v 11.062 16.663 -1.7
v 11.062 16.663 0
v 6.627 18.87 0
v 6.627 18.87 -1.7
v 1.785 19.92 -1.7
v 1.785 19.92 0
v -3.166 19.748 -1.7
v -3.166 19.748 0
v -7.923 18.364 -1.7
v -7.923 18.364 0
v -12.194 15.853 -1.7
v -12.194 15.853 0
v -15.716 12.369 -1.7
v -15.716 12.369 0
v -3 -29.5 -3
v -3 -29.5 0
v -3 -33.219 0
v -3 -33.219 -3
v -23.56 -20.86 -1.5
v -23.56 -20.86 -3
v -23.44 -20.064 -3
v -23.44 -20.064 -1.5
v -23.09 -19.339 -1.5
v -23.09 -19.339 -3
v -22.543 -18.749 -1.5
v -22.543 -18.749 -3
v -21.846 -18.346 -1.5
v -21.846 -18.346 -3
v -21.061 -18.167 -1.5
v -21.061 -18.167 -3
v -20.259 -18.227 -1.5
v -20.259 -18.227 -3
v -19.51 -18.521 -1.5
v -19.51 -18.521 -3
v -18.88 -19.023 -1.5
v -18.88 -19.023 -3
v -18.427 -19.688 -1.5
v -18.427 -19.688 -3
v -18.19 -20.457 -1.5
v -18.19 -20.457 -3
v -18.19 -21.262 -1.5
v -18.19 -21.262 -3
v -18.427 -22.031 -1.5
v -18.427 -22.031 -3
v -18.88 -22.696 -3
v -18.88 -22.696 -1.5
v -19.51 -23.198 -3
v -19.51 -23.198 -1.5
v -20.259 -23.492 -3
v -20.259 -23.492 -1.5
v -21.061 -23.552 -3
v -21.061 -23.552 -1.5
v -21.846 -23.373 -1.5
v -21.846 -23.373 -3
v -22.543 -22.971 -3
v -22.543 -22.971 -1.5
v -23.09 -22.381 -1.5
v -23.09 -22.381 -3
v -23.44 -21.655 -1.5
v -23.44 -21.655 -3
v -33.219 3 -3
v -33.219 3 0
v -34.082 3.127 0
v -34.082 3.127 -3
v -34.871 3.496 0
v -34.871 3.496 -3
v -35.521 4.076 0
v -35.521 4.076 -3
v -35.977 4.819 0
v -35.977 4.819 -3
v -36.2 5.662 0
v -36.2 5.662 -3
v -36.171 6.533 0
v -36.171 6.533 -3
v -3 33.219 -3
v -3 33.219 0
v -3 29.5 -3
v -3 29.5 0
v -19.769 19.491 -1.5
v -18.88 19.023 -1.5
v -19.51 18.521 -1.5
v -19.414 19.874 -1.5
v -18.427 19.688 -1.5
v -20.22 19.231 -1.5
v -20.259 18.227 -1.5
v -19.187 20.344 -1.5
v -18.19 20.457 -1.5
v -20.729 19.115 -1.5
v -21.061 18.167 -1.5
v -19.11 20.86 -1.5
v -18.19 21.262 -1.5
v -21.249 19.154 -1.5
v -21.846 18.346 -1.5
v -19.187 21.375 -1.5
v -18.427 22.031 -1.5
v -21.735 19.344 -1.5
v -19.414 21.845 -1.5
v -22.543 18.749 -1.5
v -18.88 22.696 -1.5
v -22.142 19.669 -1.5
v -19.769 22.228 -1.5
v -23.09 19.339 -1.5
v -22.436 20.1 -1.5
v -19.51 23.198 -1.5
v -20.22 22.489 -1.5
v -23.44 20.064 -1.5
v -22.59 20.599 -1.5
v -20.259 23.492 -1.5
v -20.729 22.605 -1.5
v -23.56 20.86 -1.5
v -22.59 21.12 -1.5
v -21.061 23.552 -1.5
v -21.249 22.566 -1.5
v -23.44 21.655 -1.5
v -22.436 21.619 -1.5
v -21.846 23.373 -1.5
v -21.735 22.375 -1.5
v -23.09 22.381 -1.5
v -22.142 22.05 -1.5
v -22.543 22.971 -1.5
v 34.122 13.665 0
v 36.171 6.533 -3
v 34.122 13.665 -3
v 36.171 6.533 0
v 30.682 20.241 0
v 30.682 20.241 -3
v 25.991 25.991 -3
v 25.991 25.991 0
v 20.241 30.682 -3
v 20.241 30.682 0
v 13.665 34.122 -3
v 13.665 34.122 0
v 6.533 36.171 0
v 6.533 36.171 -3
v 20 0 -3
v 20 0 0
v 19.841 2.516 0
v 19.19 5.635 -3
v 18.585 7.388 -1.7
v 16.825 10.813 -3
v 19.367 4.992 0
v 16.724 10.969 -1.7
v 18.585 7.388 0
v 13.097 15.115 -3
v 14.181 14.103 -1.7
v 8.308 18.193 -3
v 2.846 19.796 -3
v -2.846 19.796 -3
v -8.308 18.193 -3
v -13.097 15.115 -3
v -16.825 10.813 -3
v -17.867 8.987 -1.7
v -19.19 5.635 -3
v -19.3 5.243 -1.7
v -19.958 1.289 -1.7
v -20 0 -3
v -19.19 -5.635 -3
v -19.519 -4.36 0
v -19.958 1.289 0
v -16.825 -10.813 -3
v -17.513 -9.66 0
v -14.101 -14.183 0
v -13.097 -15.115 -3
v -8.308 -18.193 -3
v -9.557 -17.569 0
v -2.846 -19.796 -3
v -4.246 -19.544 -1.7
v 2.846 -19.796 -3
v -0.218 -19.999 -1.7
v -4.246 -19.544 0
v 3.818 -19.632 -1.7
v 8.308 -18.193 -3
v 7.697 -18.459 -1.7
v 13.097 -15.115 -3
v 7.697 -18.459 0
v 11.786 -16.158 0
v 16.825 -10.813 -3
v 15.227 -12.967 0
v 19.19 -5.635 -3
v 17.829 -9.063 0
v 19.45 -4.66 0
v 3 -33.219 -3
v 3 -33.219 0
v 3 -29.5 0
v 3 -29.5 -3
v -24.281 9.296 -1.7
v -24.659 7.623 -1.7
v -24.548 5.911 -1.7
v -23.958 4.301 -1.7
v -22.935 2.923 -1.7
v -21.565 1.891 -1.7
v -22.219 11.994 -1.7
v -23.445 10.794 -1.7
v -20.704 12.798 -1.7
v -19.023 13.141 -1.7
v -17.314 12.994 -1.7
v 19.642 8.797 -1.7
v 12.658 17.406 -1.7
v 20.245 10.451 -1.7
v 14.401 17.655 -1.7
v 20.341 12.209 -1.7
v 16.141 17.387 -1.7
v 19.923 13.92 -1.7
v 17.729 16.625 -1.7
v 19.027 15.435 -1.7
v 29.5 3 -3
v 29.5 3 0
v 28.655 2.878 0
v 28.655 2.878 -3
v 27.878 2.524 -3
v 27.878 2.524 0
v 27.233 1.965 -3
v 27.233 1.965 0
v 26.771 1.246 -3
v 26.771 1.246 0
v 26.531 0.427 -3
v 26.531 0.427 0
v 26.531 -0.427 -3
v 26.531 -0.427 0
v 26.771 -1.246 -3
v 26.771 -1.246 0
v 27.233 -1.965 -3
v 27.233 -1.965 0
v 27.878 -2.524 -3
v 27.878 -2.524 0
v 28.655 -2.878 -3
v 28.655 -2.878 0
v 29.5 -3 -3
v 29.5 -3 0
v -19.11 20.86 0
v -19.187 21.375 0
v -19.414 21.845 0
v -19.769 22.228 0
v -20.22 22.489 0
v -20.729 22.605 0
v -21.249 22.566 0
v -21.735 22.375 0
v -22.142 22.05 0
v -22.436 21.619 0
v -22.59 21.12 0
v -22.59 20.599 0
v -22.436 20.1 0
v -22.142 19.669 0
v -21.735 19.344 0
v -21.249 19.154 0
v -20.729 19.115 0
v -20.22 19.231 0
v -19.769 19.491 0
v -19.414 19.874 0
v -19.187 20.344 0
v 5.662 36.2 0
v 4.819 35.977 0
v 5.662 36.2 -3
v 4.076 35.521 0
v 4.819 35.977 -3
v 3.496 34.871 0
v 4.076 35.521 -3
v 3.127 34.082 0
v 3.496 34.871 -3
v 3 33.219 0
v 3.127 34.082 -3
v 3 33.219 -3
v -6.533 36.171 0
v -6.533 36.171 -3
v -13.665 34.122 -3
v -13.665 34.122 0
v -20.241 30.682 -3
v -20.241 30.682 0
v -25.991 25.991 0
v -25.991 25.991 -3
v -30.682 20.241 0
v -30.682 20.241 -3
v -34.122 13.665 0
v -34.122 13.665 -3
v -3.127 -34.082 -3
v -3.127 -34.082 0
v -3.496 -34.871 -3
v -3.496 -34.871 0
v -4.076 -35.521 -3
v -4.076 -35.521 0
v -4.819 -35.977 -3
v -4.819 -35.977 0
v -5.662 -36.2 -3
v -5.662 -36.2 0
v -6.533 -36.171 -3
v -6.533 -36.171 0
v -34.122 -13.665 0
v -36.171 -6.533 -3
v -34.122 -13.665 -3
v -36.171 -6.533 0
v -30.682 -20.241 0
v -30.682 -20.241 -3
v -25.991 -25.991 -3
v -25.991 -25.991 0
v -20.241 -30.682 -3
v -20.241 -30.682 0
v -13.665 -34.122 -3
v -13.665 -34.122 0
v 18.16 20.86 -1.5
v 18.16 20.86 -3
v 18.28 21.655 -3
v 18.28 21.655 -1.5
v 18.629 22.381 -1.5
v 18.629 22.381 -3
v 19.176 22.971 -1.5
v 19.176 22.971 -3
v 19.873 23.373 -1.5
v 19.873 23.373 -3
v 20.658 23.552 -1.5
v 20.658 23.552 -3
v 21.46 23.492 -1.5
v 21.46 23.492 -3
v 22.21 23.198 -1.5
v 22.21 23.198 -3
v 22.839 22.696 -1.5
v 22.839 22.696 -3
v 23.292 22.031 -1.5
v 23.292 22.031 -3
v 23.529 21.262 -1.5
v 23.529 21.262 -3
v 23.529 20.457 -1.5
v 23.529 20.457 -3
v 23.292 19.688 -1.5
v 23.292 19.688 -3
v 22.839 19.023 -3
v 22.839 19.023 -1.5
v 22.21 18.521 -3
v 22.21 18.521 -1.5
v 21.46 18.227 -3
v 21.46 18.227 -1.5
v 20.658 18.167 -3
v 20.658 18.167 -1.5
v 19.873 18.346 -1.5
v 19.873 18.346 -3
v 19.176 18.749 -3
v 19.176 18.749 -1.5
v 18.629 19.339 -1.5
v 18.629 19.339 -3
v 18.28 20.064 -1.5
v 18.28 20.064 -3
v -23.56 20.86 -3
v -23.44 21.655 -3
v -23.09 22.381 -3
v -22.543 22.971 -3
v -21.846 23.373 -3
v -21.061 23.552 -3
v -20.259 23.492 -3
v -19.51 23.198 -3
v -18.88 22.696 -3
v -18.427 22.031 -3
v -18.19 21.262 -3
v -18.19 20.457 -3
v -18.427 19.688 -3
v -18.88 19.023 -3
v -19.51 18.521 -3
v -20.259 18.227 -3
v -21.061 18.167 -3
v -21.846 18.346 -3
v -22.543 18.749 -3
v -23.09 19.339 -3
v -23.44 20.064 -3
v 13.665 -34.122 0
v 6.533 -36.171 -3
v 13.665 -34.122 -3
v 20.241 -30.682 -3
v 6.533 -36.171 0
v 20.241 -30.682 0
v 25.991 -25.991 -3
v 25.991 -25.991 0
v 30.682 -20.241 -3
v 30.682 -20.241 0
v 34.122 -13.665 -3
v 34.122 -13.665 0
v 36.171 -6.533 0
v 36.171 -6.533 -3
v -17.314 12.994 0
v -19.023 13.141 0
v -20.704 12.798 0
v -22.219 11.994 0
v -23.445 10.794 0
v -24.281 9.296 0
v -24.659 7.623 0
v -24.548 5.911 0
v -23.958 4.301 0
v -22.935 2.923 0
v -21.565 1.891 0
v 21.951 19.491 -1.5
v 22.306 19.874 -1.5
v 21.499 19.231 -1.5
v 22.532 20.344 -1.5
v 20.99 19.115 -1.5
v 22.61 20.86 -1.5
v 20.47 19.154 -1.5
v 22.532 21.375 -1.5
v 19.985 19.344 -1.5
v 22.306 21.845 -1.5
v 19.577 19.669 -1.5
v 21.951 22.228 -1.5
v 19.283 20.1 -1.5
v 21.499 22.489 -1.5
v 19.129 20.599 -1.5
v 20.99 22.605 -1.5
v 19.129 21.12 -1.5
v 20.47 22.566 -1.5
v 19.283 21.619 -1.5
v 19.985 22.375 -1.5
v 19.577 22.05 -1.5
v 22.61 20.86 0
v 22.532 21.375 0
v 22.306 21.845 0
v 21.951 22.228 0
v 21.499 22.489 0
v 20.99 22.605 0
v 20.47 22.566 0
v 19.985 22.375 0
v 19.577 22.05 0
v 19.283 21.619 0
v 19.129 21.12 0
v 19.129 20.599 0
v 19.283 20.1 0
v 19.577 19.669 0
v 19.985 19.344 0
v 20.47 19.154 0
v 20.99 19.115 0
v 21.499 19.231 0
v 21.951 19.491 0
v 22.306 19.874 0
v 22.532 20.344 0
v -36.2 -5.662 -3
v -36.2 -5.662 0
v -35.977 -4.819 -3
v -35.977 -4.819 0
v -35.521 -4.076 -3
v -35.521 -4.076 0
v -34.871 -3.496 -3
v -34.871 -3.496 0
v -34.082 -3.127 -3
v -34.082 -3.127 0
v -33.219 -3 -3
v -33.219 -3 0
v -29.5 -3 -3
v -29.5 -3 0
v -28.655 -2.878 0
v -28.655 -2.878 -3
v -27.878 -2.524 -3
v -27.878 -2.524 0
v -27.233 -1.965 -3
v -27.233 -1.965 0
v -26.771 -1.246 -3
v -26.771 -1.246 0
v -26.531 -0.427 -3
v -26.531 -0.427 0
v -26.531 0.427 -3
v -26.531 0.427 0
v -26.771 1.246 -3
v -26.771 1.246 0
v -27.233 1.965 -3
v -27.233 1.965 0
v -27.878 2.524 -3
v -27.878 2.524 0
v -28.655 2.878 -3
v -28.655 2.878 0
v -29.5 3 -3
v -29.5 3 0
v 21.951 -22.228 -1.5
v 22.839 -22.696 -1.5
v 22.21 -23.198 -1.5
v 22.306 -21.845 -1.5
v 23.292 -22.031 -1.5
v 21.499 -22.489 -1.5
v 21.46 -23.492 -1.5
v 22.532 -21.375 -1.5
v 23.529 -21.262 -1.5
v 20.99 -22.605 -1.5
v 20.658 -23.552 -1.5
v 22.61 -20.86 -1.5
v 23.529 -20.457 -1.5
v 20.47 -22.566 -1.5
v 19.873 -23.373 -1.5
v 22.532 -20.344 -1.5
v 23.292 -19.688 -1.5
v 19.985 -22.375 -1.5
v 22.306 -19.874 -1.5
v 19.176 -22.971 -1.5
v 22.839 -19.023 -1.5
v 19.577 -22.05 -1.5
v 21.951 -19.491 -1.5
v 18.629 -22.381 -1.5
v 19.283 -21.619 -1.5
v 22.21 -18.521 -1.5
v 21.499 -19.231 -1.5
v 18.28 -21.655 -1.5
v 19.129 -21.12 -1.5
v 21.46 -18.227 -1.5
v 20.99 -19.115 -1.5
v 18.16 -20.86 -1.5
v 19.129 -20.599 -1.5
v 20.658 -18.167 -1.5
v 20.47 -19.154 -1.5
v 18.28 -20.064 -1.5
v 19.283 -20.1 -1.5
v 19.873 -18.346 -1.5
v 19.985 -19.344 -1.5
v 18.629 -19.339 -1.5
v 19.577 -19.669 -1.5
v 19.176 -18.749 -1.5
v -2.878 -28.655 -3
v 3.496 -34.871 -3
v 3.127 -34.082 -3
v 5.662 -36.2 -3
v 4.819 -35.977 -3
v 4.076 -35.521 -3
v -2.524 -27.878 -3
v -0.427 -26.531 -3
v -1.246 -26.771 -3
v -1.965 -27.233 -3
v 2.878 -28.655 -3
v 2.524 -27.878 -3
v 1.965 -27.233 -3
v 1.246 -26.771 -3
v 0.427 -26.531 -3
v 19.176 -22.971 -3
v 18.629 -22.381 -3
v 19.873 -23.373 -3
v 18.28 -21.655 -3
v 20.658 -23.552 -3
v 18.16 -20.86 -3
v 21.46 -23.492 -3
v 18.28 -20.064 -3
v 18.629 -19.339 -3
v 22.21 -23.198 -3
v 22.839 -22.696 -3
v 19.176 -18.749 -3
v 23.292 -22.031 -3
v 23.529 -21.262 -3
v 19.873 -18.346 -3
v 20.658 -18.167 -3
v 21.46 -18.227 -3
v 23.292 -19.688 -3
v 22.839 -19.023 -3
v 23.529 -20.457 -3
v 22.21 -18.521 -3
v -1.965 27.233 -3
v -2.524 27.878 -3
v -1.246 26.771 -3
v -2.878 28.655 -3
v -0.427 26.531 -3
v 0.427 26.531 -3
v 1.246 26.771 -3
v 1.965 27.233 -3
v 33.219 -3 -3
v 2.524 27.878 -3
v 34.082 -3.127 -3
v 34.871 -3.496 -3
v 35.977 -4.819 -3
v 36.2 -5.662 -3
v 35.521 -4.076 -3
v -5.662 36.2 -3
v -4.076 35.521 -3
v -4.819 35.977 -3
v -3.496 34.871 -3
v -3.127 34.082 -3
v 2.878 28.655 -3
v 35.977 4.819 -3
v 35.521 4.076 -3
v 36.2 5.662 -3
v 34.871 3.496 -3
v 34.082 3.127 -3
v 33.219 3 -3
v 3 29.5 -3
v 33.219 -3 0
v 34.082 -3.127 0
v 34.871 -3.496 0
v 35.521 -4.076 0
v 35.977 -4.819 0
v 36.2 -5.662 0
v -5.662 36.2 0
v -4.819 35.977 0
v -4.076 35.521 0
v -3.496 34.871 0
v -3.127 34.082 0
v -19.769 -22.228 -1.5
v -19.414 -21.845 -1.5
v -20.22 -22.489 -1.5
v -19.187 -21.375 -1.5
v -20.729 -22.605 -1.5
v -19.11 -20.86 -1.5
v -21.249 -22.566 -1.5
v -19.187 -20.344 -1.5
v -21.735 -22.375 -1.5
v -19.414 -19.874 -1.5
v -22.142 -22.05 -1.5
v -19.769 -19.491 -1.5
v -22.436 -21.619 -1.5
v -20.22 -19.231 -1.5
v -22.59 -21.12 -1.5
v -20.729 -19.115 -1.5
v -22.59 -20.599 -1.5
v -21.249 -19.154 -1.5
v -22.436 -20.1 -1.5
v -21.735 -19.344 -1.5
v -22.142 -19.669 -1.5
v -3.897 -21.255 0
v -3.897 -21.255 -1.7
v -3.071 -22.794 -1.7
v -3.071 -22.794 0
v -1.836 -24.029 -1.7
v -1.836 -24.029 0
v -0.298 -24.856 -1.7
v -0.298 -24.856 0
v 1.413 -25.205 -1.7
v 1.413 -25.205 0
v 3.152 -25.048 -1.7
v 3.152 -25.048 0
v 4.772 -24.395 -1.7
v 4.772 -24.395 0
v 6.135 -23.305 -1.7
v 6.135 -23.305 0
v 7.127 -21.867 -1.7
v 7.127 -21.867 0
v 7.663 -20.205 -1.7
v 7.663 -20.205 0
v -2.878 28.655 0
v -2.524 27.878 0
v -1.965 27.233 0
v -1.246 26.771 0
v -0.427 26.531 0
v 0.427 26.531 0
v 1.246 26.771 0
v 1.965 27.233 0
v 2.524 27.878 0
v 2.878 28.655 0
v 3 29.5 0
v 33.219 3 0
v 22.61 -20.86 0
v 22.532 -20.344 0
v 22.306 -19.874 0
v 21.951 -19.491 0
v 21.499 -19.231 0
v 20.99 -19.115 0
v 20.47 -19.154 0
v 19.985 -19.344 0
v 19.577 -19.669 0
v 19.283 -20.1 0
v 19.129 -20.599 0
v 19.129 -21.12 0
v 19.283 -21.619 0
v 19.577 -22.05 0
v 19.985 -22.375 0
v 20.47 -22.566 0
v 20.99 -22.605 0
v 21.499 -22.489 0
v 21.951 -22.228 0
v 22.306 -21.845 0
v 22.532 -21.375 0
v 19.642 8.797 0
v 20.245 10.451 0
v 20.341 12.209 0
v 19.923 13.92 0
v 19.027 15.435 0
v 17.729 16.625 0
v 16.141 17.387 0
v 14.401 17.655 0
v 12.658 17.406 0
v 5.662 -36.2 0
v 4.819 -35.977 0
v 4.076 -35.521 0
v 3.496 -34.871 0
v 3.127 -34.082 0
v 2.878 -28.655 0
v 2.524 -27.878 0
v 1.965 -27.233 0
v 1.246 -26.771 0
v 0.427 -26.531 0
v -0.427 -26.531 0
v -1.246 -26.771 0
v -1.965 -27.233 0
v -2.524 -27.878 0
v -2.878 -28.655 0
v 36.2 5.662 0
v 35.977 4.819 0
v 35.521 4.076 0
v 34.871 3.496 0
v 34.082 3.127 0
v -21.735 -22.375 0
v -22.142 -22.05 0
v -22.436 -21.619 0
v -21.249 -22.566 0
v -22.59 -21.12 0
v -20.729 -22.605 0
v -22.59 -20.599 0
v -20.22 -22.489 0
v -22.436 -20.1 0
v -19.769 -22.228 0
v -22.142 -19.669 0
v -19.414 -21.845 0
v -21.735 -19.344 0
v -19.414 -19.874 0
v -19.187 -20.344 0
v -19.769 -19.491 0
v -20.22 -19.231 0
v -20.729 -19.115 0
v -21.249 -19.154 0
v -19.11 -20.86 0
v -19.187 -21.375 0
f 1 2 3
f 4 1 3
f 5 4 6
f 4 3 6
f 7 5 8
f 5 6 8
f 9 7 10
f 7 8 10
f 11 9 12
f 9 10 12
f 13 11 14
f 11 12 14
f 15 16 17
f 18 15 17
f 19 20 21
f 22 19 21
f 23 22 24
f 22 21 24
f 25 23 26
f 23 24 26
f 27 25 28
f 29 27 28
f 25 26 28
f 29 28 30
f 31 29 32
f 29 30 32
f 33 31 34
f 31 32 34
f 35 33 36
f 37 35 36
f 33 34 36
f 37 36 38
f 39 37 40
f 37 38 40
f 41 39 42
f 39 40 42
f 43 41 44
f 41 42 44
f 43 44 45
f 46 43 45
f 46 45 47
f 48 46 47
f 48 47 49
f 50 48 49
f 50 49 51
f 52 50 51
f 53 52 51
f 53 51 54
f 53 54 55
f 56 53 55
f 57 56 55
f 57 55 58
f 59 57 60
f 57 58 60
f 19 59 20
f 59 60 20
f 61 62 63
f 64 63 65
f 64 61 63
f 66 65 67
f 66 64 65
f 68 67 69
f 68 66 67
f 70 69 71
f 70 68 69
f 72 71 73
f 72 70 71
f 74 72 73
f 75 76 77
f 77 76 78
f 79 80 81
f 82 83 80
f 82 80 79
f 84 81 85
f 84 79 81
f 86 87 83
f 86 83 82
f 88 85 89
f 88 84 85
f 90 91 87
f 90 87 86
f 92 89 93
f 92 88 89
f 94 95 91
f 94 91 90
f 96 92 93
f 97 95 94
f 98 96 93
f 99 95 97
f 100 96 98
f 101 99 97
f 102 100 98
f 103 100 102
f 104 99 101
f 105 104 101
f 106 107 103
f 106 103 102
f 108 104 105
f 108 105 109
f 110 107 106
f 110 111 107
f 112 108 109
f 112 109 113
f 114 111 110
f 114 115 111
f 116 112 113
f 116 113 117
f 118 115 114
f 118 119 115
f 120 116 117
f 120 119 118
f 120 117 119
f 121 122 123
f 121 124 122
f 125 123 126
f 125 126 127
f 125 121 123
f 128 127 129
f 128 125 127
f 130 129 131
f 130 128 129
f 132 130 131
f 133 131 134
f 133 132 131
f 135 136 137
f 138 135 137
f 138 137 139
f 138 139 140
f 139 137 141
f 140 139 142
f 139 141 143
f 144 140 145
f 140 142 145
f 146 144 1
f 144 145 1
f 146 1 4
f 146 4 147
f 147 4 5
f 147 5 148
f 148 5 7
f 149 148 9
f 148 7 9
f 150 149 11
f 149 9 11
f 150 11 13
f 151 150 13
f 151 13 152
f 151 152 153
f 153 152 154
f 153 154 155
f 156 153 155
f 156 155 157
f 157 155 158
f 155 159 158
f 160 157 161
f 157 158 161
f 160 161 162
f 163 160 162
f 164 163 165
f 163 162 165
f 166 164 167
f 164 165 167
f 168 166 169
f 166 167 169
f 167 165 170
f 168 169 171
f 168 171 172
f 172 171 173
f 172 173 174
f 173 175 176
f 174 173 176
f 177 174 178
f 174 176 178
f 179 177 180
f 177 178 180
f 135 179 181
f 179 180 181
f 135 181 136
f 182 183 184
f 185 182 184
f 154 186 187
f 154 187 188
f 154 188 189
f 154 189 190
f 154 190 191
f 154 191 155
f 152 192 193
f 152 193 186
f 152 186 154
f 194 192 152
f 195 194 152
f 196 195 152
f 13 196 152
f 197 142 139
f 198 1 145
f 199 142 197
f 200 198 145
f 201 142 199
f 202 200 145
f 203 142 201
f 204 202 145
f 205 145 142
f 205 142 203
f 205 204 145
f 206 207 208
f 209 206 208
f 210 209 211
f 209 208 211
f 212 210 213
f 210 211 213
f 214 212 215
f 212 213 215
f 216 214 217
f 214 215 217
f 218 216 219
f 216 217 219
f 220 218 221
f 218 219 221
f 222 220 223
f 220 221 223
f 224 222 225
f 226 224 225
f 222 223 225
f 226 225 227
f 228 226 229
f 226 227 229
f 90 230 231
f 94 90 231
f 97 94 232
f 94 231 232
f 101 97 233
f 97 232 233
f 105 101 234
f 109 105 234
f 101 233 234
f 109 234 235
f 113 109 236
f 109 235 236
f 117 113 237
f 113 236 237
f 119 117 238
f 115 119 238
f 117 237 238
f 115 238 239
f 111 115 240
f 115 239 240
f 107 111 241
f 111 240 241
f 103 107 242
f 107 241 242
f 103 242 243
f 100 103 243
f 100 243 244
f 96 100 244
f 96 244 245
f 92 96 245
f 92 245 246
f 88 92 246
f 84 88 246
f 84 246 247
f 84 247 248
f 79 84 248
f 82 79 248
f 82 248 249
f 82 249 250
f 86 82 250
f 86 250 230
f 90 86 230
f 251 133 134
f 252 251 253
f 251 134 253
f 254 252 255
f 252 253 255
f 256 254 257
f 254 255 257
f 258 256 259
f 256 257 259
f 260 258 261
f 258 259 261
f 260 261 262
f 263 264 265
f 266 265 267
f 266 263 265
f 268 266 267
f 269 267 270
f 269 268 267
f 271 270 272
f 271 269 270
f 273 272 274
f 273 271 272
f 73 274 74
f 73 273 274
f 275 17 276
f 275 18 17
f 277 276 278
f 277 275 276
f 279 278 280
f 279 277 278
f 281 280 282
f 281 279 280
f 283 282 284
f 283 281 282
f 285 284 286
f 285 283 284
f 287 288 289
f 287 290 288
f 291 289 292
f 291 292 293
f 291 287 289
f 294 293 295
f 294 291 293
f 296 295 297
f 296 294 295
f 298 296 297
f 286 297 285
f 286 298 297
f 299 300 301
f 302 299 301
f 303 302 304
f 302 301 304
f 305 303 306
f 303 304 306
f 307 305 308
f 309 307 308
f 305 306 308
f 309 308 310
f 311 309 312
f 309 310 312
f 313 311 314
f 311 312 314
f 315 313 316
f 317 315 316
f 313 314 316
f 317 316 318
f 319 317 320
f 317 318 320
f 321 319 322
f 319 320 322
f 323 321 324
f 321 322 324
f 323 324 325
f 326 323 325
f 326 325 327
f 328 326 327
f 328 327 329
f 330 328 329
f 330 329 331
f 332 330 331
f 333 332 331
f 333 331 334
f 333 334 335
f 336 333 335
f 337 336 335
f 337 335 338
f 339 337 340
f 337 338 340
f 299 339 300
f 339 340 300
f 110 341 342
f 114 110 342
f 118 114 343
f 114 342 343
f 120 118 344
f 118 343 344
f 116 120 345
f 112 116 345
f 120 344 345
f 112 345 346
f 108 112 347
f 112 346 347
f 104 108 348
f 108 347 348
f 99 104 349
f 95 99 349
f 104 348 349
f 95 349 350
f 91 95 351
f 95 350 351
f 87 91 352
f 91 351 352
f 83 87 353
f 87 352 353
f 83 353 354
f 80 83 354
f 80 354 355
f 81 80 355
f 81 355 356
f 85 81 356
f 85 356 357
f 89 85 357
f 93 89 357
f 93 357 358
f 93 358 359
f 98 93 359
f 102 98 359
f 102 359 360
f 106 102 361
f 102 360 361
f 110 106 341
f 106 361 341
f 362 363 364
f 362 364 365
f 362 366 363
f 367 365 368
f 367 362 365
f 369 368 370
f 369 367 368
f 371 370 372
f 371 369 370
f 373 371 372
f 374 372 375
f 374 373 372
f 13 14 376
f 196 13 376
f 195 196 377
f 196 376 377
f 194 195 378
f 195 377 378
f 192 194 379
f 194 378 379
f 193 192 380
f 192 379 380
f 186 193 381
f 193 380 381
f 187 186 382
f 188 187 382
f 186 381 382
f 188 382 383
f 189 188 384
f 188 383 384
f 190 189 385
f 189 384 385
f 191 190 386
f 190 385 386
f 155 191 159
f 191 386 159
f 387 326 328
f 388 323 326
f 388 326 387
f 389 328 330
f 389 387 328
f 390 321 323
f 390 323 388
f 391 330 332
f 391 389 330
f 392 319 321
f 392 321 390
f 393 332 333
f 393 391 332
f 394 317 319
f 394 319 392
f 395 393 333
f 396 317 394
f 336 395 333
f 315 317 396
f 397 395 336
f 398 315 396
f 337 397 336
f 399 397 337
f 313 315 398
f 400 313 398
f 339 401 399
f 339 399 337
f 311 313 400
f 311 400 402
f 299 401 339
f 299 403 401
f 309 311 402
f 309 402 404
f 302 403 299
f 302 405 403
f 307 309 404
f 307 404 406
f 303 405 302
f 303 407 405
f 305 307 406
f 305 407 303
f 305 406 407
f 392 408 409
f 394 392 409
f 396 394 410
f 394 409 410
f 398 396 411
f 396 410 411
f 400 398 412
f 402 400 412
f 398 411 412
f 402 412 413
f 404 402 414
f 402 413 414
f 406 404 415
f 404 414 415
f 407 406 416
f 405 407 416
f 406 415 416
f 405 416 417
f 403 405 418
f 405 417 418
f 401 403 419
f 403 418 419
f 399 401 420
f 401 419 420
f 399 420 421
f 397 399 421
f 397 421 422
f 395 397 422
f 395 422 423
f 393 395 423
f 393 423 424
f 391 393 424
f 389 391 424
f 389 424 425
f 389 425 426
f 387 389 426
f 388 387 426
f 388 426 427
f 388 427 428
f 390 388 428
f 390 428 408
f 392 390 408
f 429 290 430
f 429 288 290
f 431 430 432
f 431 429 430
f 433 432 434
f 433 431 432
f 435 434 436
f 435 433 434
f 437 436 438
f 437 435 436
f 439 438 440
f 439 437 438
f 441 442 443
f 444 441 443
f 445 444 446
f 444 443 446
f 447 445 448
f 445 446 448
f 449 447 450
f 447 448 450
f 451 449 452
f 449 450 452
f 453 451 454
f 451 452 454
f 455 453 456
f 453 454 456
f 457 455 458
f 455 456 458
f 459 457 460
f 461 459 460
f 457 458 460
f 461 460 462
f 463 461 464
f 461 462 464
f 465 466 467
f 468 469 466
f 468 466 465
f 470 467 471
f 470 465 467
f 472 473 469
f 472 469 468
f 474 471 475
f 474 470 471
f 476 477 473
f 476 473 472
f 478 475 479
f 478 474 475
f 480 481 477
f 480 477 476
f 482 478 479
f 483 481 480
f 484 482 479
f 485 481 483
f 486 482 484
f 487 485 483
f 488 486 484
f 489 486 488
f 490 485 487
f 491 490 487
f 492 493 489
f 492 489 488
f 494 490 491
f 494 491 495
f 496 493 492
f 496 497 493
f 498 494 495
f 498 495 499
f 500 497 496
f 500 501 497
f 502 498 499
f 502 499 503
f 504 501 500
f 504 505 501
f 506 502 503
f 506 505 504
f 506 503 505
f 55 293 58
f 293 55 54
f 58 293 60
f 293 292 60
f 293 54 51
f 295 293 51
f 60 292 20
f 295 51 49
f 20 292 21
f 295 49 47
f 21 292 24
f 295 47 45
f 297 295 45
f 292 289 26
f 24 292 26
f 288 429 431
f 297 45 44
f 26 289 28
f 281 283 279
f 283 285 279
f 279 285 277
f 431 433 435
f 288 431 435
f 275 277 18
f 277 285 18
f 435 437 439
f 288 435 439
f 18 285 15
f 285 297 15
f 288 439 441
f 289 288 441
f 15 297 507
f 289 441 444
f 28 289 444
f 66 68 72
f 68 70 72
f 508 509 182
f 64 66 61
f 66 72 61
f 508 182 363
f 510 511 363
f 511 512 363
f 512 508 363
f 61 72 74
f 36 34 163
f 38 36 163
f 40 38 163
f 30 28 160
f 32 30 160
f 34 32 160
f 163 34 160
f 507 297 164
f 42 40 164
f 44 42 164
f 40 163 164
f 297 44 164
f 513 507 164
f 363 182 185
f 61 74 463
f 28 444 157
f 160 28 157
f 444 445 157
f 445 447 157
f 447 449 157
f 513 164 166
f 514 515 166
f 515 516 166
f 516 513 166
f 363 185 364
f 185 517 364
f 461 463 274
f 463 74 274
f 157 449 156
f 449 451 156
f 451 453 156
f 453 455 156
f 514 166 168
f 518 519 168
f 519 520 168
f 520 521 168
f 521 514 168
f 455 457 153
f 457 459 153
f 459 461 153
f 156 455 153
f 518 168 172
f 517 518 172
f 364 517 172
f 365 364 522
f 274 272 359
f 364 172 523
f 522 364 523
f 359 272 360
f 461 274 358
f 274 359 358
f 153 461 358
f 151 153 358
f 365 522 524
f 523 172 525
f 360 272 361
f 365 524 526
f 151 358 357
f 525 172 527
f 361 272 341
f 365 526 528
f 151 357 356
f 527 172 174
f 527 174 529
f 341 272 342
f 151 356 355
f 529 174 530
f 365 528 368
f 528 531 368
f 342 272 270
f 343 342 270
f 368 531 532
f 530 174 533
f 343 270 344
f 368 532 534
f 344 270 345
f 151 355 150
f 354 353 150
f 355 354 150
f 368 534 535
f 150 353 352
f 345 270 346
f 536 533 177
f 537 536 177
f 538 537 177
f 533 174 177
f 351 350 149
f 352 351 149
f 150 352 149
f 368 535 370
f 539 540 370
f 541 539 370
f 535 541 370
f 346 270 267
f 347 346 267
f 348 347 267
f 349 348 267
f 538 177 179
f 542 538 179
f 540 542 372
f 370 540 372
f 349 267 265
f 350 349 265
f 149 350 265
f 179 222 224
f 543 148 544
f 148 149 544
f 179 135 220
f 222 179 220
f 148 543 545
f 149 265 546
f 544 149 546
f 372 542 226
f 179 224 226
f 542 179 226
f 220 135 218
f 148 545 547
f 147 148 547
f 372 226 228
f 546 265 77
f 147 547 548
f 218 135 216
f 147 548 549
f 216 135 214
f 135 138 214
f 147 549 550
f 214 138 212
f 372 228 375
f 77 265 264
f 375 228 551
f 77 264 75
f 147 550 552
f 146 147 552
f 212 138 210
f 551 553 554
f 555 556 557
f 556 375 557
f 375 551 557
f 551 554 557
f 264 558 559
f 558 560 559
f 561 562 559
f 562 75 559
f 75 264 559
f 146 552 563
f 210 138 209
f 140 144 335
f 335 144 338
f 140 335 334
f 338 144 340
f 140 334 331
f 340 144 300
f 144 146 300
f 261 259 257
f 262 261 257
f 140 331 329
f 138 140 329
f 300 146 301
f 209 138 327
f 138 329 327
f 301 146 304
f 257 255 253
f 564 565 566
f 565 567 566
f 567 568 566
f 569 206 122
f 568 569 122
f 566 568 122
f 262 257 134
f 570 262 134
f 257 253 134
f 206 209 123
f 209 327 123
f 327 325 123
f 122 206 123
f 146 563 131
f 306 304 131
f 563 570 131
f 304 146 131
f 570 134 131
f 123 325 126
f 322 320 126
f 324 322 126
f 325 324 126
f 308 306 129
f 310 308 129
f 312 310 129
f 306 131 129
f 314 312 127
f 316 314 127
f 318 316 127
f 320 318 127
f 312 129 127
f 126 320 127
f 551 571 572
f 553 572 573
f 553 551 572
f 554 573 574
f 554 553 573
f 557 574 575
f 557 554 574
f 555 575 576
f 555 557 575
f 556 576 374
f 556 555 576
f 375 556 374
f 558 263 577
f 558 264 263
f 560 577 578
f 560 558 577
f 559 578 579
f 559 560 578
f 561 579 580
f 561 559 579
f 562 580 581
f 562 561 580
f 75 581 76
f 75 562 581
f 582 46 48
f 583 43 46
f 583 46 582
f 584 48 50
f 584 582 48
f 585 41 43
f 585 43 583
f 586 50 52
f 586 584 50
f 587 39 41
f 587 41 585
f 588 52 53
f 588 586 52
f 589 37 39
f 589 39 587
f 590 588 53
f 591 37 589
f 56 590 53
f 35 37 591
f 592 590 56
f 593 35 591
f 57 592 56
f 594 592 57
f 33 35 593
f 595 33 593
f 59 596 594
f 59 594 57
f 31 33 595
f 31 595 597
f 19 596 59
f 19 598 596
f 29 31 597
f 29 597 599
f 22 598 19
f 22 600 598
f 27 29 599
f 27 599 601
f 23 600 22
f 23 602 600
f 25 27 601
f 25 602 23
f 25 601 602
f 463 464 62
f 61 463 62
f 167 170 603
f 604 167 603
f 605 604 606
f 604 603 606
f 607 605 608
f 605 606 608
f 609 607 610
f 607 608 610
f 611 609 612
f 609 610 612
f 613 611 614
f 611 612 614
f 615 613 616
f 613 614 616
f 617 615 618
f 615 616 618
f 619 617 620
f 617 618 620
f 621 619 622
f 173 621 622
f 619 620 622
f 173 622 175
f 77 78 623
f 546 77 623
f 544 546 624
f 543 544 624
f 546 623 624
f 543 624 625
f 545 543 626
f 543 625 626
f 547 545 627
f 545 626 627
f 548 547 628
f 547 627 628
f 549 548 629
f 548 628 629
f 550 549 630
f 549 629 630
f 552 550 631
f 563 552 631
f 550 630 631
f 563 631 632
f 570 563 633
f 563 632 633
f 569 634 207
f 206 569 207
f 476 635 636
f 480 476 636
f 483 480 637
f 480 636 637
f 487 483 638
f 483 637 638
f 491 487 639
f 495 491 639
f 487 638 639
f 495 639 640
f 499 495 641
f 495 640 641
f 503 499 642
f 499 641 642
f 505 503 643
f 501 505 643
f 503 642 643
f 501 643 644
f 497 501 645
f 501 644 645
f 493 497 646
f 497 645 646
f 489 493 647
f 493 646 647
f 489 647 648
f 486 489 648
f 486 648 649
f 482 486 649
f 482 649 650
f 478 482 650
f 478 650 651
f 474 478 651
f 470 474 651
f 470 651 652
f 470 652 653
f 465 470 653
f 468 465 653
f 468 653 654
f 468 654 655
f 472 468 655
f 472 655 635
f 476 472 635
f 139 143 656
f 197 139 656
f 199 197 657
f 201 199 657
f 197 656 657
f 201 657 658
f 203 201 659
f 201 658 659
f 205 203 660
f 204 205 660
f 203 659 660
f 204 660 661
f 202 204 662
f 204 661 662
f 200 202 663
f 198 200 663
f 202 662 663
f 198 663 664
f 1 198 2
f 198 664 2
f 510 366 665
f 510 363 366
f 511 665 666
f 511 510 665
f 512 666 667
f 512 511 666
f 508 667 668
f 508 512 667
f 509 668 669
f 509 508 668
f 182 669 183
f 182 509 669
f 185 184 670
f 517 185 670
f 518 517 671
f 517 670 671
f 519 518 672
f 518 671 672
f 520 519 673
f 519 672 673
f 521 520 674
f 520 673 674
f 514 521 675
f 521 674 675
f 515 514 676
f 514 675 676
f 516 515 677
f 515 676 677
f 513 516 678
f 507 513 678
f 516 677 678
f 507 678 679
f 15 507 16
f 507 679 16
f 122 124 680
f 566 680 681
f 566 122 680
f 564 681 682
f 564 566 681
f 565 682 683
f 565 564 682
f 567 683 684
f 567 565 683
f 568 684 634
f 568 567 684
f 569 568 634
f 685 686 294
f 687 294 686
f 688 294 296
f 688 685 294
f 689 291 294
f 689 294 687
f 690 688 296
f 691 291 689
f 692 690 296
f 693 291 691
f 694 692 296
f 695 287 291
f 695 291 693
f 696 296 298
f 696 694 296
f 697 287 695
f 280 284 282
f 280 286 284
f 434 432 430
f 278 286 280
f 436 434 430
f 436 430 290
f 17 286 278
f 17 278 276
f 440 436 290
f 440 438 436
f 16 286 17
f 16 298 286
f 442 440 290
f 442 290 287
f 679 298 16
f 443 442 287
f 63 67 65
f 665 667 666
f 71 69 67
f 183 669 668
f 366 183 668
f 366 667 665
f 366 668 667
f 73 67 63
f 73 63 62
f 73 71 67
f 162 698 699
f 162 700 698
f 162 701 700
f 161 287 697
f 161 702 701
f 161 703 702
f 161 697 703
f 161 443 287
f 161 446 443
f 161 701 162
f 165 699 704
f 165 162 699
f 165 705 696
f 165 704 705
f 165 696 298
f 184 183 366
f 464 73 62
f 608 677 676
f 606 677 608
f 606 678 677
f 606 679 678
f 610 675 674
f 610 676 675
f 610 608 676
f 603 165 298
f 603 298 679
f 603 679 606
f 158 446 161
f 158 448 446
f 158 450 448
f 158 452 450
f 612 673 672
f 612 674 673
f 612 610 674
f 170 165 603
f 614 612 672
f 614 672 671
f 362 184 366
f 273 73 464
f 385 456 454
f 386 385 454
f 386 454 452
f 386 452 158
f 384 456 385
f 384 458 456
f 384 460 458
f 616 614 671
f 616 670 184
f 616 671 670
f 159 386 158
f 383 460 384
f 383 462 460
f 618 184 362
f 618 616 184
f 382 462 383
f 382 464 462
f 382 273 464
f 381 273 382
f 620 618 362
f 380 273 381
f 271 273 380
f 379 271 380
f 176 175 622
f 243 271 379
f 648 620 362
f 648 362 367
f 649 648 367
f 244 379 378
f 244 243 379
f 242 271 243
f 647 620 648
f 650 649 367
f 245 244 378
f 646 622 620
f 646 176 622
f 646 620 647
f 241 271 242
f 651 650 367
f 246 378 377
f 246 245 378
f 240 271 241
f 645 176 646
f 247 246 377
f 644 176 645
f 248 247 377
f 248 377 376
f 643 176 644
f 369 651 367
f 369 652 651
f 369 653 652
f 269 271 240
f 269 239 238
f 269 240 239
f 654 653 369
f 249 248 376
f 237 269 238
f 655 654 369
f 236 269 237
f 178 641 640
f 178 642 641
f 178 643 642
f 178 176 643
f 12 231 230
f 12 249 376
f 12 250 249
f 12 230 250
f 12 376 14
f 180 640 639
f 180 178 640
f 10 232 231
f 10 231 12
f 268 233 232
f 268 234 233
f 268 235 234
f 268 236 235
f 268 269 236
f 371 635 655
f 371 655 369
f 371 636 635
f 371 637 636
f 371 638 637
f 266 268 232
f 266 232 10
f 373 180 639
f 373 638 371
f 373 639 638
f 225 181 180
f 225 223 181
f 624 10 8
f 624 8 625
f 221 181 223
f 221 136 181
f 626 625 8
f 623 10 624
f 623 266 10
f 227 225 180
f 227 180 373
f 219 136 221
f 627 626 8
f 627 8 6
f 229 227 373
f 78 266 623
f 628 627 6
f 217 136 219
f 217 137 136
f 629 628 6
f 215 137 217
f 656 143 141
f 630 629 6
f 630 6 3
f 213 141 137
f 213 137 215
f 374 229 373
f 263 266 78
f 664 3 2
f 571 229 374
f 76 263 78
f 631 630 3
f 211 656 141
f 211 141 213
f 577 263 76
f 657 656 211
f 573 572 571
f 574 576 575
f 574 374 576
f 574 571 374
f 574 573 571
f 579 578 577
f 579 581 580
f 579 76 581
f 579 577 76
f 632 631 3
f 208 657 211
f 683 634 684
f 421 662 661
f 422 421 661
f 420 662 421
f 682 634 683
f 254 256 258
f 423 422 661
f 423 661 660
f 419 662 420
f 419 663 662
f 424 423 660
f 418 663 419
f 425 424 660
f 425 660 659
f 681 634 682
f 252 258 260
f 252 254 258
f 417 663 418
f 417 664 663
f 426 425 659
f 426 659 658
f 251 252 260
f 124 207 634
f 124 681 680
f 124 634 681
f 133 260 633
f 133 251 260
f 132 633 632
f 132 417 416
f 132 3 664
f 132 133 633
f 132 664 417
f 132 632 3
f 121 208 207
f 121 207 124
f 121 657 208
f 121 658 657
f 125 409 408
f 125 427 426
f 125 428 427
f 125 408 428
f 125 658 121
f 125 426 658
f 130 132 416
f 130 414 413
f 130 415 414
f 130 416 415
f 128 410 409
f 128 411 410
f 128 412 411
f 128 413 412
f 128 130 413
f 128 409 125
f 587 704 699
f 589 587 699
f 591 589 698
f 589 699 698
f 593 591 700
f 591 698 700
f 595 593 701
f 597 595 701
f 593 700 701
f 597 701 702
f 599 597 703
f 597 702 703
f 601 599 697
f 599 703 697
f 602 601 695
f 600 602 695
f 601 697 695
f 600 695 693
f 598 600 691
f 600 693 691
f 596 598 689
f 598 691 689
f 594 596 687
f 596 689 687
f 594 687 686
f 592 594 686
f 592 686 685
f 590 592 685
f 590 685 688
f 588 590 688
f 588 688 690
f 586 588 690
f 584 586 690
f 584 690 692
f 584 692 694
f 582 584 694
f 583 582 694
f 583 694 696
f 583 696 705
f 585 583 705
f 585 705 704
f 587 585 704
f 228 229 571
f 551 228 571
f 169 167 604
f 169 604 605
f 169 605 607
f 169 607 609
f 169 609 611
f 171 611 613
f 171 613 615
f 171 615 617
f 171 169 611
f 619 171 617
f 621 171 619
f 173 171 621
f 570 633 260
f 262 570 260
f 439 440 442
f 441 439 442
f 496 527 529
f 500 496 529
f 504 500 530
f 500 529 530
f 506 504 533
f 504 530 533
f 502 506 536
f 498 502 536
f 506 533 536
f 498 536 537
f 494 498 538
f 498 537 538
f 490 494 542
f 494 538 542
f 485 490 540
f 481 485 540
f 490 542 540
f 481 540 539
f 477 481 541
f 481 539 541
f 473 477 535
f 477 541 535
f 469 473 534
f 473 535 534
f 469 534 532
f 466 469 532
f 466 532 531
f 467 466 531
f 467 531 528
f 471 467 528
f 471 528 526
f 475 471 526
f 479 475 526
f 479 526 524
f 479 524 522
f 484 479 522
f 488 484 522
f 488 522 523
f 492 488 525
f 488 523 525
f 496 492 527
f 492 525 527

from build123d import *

# Parameters (mm, degrees)
SKETCH5_R                = 36.756756757
SKETCH5_R_2              = 20
BOSS_EXTRUDE1_DEPTH      = 3
SKETCH8_R                = 1.75
CUT_EXTRUDE3_DEPTH       = 5
SKETCH27_R               = 1.75
CUT_EXTRUDE9_DEPTH       = 5
SKETCH28_R               = 1.75
CUT_EXTRUDE10_DEPTH      = 10
FILLET1_R                = 3
CIRPATTERN1_COUNT        = 4
FILLET1_OF_CIRPATTERN1_R = 3
SKETCH32_R               = 6
SKETCH32_R_2             = 20
CUT_EXTRUDE11_DEPTH      = 1.7
SKETCH33_R               = 2.7
CUT_EXTRUDE12_DEPTH      = 1.5


with BuildPart() as part:
    # Sketch5 → Boss-Extrude1 (new body)
    with BuildSketch(Plane.XY):
        Circle(SKETCH5_R)
        Circle(SKETCH5_R_2, mode=Mode.SUBTRACT)
    extrude(amount=-BOSS_EXTRUDE1_DEPTH)

    # Sketch8 → Cut-Extrude3 (cut)
    with BuildSketch(Plane.XY):
        with Locations((20.859650045, 20.859650045)):
            Circle(SKETCH8_R)
        with Locations((-20.859650045, 20.859650045)):
            Circle(SKETCH8_R)
        with Locations((-20.859650045, -20.859650045)):
            Circle(SKETCH8_R)
        with Locations((20.859650045, -20.859650045)):
            Circle(SKETCH8_R)
    extrude(amount=-CUT_EXTRUDE3_DEPTH, mode=Mode.SUBTRACT)

    # Sketch27 → Cut-Extrude9 (cut)
    with BuildSketch(Plane.XY):
        with Locations((0, 29.5)):
            Circle(SKETCH27_R)
        with Locations((29.5, 0)):
            Circle(SKETCH27_R)
        with Locations((0, -29.5)):
            Circle(SKETCH27_R)
        with Locations((-29.5, 0)):
            Circle(SKETCH27_R)
    extrude(amount=-CUT_EXTRUDE9_DEPTH, mode=Mode.SUBTRACT)

    # Sketch28 → Cut-Extrude10 (cut)
    with BuildSketch(Plane.XY):
        with BuildLine():
            Line((-3, 36.63412572), (-3, 29.5))
            ThreePointArc((-3, 29.5), (0, 26.5), (3, 29.5))
            Line((3, 29.5), (3, 36.63412572))
            ThreePointArc((3, 36.63412572), (0, 36.756756757), (-3, 36.63412572))
        make_face()
        with Locations((0, 29.5)):
            Circle(SKETCH28_R, mode=Mode.SUBTRACT)
    cut_extrude10 = extrude(amount=-CUT_EXTRUDE10_DEPTH, mode=Mode.SUBTRACT)

    # Fillet1
    fillet1_edges = [part.edges().sort_by_distance(p)[0] for p in [
        (-3, 36.63412572, -1.5),
        (3, 36.63412572, -1.5),
    ]]
    fillet(fillet1_edges, radius=FILLET1_R)

    # CirPattern1: Cut-Extrude10 ×4 about axis
    cirpattern1_axis = Axis((0, 0, 0), (0, 0, 1))
    for i in range(1, CIRPATTERN1_COUNT):
        add(cut_extrude10.rotate(cirpattern1_axis, i * 360 / CIRPATTERN1_COUNT), mode=Mode.SUBTRACT)

    # Fillet1 of CirPattern1
    fillet1_of_cirpattern1_edges = [part.edges().sort_by_distance(p)[0] for p in [
        (-36.63412572, -3, -1.5),
        (-36.63412572, 3, -1.5),
        (3, -36.63412572, -1.5),
        (-3, -36.63412572, -1.5),
        (36.63412572, 3, -1.5),
        (36.63412572, -3, -1.5),
    ]]
    fillet(fillet1_of_cirpattern1_edges, radius=FILLET1_OF_CIRPATTERN1_R)

    # Sketch32 → Cut-Extrude11 (cut)
    with BuildSketch(Plane.XY):
        with Locations((-18.677893379, 7.150964894)):
            Circle(SKETCH32_R)
        Circle(SKETCH32_R_2)
        with Locations((14.366974153, 11.655044131)):
            Circle(SKETCH32_R)
        with Locations((1.745187427, -19.214690235)):
            Circle(SKETCH32_R)
    extrude(amount=-CUT_EXTRUDE11_DEPTH, mode=Mode.SUBTRACT)

    # Sketch33 → Cut-Extrude12 (cut)
    with BuildSketch(Plane(origin=(0, 0, -3), x_dir=(-1, 0, 0), z_dir=(0, 0, -1))):
        with Locations((-20.859650045, 20.859650045)):
            Circle(SKETCH33_R)
        with Locations((20.859650045, 20.859650045)):
            Circle(SKETCH33_R)
        with Locations((20.859650045, -20.859650045)):
            Circle(SKETCH33_R)
        with Locations((-20.859650045, -20.859650045)):
            Circle(SKETCH33_R)
    extrude(amount=-CUT_EXTRUDE12_DEPTH, mode=Mode.SUBTRACT)


solid = part.part
